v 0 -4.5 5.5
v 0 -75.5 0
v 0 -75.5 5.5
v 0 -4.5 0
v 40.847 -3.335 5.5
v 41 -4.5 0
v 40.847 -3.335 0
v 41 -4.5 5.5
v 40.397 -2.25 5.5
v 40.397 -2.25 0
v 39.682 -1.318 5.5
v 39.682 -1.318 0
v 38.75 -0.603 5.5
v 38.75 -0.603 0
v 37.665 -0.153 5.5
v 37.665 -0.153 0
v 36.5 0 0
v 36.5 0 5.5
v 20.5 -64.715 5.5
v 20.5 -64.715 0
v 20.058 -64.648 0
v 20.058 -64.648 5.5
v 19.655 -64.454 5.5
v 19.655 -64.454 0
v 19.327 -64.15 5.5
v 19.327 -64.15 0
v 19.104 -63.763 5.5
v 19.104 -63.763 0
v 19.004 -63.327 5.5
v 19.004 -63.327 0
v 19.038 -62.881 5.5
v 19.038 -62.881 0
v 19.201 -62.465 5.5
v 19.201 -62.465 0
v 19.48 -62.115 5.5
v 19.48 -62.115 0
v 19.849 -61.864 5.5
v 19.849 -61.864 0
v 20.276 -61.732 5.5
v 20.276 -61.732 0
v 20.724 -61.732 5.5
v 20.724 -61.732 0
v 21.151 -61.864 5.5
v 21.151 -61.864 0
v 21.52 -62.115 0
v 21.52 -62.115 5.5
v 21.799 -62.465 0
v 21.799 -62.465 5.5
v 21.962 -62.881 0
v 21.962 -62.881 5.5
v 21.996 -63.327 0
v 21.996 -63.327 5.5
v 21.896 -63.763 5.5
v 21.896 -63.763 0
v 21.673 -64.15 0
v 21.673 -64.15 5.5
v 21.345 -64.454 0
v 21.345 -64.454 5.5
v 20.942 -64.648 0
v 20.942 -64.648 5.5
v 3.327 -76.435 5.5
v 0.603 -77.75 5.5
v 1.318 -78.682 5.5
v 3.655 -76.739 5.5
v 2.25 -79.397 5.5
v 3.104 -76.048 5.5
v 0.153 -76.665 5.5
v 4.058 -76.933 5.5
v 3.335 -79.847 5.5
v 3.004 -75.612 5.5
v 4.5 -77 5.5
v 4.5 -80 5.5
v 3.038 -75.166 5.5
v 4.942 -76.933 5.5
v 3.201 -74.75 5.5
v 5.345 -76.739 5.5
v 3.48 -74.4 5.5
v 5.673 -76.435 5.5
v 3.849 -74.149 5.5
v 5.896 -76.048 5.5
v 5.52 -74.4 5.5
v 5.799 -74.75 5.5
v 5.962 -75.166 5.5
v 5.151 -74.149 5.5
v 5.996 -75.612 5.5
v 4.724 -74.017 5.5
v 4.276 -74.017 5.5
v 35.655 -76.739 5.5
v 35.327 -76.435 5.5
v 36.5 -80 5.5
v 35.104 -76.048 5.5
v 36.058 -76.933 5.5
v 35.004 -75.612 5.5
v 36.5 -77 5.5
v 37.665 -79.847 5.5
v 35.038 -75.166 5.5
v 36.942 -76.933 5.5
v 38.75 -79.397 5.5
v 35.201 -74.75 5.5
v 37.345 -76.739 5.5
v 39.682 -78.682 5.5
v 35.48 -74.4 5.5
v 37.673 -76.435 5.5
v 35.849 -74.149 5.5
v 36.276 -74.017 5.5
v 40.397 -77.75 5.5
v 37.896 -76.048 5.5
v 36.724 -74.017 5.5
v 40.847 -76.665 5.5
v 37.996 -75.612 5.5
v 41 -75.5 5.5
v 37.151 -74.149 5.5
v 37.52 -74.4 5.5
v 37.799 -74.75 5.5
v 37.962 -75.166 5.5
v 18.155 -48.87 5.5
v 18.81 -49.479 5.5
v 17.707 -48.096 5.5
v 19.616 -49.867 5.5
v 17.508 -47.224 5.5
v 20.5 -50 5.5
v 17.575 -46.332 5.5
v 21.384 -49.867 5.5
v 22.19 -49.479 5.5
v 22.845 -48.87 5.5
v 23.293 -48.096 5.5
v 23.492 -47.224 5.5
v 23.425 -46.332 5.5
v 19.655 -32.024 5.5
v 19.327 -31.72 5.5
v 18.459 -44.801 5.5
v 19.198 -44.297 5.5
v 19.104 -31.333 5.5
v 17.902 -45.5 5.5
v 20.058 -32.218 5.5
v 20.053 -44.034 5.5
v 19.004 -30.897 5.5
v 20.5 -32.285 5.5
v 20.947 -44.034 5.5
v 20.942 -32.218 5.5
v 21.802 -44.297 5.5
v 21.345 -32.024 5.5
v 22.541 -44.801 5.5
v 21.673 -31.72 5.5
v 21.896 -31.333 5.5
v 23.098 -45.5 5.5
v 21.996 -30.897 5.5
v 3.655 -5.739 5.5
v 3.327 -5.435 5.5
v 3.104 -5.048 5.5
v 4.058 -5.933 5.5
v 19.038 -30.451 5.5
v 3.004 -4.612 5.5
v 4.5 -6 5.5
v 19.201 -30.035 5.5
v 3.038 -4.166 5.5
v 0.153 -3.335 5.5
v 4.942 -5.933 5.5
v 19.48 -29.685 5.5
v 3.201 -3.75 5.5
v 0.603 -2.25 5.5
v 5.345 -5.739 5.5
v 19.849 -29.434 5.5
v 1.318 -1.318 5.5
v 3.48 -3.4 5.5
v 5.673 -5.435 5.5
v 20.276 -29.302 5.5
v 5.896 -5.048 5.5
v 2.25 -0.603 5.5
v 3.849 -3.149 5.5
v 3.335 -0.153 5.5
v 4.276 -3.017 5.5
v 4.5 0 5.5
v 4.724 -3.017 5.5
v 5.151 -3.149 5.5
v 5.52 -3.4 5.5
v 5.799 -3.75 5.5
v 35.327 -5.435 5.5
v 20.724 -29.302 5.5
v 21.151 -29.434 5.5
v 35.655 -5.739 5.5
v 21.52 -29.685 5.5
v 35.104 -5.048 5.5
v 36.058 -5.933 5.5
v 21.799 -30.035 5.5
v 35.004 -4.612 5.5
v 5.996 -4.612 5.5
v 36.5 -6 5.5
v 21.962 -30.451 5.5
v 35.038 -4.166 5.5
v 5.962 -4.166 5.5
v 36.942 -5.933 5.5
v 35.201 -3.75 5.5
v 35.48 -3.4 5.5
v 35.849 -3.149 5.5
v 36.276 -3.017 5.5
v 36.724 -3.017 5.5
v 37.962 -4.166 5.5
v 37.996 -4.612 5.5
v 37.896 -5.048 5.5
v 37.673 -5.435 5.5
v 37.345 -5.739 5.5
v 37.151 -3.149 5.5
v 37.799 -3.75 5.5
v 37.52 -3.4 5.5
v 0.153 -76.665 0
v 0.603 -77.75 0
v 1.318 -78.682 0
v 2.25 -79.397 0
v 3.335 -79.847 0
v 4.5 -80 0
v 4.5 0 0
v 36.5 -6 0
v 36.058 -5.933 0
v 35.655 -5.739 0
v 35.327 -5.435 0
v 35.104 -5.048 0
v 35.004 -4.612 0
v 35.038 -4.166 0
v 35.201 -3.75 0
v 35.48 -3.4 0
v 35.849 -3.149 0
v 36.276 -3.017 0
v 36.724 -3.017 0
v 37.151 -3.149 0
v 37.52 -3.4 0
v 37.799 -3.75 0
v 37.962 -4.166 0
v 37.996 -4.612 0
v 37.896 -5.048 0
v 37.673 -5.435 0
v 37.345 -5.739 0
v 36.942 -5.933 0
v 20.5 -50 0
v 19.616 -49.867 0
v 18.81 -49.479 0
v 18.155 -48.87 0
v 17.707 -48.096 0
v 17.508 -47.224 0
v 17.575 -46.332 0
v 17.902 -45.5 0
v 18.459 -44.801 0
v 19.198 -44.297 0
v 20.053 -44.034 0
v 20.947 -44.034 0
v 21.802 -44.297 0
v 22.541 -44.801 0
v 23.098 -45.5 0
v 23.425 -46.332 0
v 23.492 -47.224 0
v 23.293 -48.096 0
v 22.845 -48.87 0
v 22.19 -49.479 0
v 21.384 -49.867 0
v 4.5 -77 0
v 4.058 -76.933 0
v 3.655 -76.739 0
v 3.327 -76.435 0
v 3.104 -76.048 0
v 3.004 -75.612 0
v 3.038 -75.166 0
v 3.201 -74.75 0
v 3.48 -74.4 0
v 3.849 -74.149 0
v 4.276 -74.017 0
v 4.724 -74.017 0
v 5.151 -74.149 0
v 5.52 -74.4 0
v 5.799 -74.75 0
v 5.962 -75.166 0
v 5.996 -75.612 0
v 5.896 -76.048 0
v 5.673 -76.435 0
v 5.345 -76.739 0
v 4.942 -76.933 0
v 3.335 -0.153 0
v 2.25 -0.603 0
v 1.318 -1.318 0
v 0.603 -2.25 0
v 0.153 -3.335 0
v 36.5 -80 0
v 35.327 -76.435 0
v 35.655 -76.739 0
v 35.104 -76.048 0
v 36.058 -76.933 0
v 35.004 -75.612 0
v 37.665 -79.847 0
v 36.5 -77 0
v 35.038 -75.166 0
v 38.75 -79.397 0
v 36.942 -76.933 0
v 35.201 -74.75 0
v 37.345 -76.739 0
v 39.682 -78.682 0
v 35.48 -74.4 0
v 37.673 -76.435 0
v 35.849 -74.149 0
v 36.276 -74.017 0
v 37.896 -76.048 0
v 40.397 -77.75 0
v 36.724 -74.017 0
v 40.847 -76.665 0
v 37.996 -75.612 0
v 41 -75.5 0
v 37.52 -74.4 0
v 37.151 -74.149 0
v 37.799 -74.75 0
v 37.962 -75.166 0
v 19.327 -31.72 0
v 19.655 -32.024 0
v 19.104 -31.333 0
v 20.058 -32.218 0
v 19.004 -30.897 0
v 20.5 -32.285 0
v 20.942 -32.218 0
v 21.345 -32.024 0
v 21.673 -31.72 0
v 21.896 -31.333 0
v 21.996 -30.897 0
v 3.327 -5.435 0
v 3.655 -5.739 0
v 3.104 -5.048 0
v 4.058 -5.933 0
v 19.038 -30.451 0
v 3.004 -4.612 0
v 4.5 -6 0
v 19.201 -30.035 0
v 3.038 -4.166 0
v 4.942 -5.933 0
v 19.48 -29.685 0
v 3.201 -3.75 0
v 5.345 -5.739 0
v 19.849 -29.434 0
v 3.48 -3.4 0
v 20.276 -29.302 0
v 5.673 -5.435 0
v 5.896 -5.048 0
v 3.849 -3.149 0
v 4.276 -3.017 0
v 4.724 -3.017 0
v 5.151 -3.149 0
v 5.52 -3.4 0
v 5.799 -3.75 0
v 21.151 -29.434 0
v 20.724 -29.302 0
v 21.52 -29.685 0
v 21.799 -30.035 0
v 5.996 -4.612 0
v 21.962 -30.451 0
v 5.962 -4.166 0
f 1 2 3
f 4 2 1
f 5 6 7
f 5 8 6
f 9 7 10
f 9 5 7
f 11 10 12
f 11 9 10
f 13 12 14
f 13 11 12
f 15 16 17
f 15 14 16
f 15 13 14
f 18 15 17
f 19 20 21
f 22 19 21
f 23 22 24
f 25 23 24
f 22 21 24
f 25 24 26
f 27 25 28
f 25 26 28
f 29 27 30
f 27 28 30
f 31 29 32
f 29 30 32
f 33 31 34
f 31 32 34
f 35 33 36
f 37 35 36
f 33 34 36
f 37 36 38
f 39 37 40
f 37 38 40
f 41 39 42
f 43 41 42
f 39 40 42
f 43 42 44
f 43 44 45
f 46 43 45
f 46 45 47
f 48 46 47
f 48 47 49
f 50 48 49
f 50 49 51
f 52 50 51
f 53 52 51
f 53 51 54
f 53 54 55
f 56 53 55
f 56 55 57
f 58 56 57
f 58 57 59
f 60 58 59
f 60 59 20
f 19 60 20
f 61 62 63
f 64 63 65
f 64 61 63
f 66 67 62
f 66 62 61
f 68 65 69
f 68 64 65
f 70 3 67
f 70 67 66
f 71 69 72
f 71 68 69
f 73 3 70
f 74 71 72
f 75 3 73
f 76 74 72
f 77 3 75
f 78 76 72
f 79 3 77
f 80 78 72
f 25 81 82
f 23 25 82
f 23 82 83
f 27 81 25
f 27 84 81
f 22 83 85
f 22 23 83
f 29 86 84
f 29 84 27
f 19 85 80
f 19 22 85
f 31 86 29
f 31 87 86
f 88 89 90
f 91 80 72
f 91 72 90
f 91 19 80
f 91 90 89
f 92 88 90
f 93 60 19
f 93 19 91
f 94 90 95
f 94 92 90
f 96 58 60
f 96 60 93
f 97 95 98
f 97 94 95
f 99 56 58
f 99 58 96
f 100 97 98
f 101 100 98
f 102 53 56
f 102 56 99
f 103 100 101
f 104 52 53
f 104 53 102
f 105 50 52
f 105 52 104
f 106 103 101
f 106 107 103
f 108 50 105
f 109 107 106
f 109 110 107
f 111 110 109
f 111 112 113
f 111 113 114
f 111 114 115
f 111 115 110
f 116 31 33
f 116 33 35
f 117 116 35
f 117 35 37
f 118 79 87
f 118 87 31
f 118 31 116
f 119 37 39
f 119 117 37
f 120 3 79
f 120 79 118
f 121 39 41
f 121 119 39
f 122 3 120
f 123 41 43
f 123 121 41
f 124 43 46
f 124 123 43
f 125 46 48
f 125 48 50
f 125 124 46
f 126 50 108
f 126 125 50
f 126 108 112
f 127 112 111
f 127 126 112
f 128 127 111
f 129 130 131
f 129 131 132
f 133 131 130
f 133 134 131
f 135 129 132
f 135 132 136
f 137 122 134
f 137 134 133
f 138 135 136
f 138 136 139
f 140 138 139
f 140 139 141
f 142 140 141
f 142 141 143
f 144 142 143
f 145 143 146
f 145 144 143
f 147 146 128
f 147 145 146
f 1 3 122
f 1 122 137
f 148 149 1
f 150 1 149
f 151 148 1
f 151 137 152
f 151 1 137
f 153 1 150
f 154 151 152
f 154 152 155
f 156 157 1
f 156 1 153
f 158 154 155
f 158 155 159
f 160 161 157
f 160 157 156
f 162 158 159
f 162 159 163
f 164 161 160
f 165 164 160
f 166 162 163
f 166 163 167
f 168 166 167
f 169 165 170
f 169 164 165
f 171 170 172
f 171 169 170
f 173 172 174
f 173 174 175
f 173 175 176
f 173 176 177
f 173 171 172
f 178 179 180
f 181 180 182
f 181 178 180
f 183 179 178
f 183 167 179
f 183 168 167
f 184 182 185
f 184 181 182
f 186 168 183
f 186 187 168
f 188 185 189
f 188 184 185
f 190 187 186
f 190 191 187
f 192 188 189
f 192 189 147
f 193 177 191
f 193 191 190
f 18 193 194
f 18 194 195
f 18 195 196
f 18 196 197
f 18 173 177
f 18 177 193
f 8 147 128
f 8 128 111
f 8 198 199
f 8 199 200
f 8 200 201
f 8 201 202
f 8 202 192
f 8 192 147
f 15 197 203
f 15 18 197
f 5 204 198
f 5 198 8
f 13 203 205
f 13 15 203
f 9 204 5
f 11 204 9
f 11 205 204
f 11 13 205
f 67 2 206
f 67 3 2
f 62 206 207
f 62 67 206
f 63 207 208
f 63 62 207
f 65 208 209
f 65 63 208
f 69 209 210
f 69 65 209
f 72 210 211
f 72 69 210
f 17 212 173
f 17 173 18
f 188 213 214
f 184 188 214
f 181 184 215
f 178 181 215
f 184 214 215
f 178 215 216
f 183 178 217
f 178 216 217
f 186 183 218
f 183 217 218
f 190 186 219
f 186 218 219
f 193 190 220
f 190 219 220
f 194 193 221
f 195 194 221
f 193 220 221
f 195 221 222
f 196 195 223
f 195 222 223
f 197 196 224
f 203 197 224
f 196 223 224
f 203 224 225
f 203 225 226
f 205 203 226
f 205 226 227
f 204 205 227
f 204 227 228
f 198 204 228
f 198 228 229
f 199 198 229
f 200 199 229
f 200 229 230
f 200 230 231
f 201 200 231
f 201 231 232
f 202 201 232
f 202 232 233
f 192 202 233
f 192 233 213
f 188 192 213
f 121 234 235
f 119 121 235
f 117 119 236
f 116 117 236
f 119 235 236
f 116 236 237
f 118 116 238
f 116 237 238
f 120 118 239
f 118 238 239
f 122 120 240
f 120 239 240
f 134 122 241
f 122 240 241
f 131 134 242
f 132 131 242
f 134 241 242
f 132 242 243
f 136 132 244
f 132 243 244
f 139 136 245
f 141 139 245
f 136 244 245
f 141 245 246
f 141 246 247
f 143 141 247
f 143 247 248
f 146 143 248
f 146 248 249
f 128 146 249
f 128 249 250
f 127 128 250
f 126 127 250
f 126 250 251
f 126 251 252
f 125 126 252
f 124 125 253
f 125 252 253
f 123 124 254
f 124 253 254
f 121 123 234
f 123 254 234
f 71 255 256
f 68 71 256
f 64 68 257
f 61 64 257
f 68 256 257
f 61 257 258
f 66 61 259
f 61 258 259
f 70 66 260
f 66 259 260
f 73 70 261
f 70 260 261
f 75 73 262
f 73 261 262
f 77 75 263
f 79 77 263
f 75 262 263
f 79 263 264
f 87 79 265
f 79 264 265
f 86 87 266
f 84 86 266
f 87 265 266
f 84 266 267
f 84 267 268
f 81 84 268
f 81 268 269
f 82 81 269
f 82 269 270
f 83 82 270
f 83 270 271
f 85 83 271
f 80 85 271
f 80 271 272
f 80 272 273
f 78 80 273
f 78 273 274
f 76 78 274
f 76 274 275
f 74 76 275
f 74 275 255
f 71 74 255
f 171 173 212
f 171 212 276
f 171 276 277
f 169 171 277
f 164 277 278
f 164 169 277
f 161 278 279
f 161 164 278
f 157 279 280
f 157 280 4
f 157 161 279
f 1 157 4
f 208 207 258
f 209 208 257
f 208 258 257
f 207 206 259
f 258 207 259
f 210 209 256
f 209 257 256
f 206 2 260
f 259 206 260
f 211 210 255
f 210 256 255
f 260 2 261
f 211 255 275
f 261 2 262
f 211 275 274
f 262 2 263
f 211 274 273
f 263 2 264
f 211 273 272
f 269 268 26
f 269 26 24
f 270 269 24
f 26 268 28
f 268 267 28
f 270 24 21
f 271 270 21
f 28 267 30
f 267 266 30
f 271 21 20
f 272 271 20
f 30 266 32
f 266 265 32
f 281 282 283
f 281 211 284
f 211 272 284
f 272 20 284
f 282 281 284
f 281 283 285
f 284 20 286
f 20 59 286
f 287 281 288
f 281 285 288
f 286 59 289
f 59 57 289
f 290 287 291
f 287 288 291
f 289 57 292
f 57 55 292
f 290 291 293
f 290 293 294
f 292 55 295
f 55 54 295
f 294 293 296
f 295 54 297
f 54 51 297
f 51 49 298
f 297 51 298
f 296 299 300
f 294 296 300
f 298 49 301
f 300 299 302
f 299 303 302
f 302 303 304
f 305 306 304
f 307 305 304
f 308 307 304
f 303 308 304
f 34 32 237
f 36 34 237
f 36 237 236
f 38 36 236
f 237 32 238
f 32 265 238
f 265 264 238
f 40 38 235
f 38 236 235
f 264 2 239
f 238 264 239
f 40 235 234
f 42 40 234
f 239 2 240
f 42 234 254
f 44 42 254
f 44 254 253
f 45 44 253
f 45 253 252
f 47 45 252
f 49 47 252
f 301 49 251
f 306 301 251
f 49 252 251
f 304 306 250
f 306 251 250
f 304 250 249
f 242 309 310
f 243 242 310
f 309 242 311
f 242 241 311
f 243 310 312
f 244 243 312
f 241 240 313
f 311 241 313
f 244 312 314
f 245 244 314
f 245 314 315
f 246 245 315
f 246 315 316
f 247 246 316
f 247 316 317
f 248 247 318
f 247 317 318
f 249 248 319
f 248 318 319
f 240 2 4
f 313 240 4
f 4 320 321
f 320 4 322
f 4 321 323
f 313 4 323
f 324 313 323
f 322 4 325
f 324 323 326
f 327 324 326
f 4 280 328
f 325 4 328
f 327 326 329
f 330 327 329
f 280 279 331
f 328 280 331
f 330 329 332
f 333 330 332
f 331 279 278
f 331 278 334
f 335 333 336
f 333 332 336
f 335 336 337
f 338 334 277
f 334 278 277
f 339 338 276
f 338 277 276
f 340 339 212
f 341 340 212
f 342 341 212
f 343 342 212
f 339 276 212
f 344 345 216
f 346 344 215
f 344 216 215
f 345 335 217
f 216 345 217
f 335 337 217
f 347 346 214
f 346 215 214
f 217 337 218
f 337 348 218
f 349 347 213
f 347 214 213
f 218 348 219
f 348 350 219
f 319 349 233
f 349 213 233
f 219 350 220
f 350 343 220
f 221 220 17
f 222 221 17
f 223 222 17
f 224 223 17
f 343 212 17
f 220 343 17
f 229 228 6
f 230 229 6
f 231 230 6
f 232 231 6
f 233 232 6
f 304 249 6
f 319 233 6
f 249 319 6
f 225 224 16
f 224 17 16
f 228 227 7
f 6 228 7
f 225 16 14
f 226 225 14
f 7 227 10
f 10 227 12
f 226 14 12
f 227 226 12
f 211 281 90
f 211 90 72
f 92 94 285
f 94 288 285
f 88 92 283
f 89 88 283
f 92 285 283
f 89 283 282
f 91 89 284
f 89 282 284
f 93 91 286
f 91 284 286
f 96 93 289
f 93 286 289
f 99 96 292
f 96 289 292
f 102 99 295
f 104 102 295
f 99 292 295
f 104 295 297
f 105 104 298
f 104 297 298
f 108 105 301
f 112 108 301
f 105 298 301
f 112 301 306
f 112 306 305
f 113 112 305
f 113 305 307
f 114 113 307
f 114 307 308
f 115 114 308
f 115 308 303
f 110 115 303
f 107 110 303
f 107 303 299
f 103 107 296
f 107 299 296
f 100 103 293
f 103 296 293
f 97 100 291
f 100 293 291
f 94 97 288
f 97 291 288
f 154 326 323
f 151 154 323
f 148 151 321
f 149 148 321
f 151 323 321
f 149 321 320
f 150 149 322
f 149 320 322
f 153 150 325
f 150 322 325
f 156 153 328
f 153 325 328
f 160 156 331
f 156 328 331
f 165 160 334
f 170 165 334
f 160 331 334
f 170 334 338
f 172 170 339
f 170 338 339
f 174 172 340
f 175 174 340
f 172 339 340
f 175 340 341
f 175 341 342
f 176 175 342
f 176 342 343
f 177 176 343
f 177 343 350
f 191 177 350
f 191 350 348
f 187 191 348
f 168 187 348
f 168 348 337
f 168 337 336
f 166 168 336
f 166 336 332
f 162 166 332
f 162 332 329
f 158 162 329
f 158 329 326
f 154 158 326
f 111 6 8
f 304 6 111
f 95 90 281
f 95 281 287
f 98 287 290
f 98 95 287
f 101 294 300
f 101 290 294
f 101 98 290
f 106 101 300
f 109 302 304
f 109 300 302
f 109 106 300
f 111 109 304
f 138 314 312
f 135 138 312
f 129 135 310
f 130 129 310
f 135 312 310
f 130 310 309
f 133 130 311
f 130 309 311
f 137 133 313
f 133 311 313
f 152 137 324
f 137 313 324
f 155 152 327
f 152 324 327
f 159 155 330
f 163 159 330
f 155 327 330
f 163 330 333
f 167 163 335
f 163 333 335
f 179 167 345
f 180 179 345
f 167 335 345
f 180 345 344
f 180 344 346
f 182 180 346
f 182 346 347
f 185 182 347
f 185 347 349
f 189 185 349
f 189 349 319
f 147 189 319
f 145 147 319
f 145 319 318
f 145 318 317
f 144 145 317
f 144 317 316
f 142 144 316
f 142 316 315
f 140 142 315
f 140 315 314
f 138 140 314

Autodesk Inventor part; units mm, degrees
ref_plane "YZ Plane" through (0, 0, 0) normal (1, 0, 0) x (0, 1, 0)
ref_plane "XZ Plane" through (0, 0, 0) normal (0, 1, 0) x (-1, 0, 0)
ref_plane "XY Plane" through (0, 0, 0) normal (0, 0, 1) x (1, 0, 0)
sketch "スケッチ1" plane through (0, 0, 0) normal (0, 0, 1) x (1, 0, 0)
  line L0 (0, 0) -> (41, 0)
  line L1 (41, 0) -> (41, -80)
  line L2 (41, -80) -> (0, -80)
  line L3 (0, -80) -> (0, 0)
  dimension "d0" = 41
  dimension "d13" = 80
extrude "押し出し1" add sketch "スケッチ1" along normal blind 5.5
sketch "スケッチ2" plane through (0, 0, 5.5) normal (0, 0, 1) x (1, 0, 0)
  line L0 (4.5, -75.5) -> (36.5, -75.5)
  line L1 (36.5, -75.5) -> (36.5, -4.5)
  line L2 (36.5, -4.5) -> (4.5, -4.5)
  line L3 (4.5, -4.5) -> (4.5, -75.5)
  line L4 (0, -80) -> (41, -80) projected
  line L5 (0, 0) -> (0, -80) projected
  dimension "d3" = 4.5
  dimension "d4" = 32
  dimension "d5" = 4.5
  dimension "d14" = 71
hole "穴1" at (4.5, -4.5, 5.5) at (36.5, -4.5, 5.5) at (36.5, -75.5, 5.5) at (4.5, -75.5, 5.5) direction (0, 0, -1) diameter 3 end through all
fillet "フィレット1" radius 4.5 4 edges at (0, 0, 2.75) (41, 0, 2.75) (0, -80, 2.75) (41, -80, 2.75)
sketch "スケッチ3" plane through (0, 0, 5.5) normal (0, 0, 1) x (1, 0, 0)
  line L0 (36.5, 0) -> (4.5, 0) projected
  line L1 (41, -75.5) -> (41, -4.5) projected
  line L2 (0, -4.5) -> (0, -75.5) projected
  point P0 (0, 0)
  point P1 (20.5, -47)
  dimension "d16" = 47
  dimension "d17" = 41
  dimension "d18" = 20.5
hole "穴2" at (20.5, -47, 5.5) direction (0, 0, -1) diameter 6 end through all
sketch "スケッチ4" plane through (0, 0, 5.5) normal (0, 0, 1) x (1, 0, 0)
  circle A0 centre (20.5, -47) radius 3 projected
  point P0 (0, 0)
  point P1 (20.5, -30.785)
  point P2 (20.5, -63.215)
  dimension "d26" = 32.43
  dimension "d27" = 16.215
  dimension "d28" = 0
  dimension "d29" = 0
hole "穴3" at (20.5, -30.785, 5.5) at (20.5, -63.215, 5.5) direction (0, 0, -1) diameter 3 end through all
equation "\"d18\" = 0.5 * d17"
equation "\"d27\" = 0.5 * d26"
properties part number "上下直動t5.5_エンコーダ軸受け_CPY" material "木材 (カエデ材)"
